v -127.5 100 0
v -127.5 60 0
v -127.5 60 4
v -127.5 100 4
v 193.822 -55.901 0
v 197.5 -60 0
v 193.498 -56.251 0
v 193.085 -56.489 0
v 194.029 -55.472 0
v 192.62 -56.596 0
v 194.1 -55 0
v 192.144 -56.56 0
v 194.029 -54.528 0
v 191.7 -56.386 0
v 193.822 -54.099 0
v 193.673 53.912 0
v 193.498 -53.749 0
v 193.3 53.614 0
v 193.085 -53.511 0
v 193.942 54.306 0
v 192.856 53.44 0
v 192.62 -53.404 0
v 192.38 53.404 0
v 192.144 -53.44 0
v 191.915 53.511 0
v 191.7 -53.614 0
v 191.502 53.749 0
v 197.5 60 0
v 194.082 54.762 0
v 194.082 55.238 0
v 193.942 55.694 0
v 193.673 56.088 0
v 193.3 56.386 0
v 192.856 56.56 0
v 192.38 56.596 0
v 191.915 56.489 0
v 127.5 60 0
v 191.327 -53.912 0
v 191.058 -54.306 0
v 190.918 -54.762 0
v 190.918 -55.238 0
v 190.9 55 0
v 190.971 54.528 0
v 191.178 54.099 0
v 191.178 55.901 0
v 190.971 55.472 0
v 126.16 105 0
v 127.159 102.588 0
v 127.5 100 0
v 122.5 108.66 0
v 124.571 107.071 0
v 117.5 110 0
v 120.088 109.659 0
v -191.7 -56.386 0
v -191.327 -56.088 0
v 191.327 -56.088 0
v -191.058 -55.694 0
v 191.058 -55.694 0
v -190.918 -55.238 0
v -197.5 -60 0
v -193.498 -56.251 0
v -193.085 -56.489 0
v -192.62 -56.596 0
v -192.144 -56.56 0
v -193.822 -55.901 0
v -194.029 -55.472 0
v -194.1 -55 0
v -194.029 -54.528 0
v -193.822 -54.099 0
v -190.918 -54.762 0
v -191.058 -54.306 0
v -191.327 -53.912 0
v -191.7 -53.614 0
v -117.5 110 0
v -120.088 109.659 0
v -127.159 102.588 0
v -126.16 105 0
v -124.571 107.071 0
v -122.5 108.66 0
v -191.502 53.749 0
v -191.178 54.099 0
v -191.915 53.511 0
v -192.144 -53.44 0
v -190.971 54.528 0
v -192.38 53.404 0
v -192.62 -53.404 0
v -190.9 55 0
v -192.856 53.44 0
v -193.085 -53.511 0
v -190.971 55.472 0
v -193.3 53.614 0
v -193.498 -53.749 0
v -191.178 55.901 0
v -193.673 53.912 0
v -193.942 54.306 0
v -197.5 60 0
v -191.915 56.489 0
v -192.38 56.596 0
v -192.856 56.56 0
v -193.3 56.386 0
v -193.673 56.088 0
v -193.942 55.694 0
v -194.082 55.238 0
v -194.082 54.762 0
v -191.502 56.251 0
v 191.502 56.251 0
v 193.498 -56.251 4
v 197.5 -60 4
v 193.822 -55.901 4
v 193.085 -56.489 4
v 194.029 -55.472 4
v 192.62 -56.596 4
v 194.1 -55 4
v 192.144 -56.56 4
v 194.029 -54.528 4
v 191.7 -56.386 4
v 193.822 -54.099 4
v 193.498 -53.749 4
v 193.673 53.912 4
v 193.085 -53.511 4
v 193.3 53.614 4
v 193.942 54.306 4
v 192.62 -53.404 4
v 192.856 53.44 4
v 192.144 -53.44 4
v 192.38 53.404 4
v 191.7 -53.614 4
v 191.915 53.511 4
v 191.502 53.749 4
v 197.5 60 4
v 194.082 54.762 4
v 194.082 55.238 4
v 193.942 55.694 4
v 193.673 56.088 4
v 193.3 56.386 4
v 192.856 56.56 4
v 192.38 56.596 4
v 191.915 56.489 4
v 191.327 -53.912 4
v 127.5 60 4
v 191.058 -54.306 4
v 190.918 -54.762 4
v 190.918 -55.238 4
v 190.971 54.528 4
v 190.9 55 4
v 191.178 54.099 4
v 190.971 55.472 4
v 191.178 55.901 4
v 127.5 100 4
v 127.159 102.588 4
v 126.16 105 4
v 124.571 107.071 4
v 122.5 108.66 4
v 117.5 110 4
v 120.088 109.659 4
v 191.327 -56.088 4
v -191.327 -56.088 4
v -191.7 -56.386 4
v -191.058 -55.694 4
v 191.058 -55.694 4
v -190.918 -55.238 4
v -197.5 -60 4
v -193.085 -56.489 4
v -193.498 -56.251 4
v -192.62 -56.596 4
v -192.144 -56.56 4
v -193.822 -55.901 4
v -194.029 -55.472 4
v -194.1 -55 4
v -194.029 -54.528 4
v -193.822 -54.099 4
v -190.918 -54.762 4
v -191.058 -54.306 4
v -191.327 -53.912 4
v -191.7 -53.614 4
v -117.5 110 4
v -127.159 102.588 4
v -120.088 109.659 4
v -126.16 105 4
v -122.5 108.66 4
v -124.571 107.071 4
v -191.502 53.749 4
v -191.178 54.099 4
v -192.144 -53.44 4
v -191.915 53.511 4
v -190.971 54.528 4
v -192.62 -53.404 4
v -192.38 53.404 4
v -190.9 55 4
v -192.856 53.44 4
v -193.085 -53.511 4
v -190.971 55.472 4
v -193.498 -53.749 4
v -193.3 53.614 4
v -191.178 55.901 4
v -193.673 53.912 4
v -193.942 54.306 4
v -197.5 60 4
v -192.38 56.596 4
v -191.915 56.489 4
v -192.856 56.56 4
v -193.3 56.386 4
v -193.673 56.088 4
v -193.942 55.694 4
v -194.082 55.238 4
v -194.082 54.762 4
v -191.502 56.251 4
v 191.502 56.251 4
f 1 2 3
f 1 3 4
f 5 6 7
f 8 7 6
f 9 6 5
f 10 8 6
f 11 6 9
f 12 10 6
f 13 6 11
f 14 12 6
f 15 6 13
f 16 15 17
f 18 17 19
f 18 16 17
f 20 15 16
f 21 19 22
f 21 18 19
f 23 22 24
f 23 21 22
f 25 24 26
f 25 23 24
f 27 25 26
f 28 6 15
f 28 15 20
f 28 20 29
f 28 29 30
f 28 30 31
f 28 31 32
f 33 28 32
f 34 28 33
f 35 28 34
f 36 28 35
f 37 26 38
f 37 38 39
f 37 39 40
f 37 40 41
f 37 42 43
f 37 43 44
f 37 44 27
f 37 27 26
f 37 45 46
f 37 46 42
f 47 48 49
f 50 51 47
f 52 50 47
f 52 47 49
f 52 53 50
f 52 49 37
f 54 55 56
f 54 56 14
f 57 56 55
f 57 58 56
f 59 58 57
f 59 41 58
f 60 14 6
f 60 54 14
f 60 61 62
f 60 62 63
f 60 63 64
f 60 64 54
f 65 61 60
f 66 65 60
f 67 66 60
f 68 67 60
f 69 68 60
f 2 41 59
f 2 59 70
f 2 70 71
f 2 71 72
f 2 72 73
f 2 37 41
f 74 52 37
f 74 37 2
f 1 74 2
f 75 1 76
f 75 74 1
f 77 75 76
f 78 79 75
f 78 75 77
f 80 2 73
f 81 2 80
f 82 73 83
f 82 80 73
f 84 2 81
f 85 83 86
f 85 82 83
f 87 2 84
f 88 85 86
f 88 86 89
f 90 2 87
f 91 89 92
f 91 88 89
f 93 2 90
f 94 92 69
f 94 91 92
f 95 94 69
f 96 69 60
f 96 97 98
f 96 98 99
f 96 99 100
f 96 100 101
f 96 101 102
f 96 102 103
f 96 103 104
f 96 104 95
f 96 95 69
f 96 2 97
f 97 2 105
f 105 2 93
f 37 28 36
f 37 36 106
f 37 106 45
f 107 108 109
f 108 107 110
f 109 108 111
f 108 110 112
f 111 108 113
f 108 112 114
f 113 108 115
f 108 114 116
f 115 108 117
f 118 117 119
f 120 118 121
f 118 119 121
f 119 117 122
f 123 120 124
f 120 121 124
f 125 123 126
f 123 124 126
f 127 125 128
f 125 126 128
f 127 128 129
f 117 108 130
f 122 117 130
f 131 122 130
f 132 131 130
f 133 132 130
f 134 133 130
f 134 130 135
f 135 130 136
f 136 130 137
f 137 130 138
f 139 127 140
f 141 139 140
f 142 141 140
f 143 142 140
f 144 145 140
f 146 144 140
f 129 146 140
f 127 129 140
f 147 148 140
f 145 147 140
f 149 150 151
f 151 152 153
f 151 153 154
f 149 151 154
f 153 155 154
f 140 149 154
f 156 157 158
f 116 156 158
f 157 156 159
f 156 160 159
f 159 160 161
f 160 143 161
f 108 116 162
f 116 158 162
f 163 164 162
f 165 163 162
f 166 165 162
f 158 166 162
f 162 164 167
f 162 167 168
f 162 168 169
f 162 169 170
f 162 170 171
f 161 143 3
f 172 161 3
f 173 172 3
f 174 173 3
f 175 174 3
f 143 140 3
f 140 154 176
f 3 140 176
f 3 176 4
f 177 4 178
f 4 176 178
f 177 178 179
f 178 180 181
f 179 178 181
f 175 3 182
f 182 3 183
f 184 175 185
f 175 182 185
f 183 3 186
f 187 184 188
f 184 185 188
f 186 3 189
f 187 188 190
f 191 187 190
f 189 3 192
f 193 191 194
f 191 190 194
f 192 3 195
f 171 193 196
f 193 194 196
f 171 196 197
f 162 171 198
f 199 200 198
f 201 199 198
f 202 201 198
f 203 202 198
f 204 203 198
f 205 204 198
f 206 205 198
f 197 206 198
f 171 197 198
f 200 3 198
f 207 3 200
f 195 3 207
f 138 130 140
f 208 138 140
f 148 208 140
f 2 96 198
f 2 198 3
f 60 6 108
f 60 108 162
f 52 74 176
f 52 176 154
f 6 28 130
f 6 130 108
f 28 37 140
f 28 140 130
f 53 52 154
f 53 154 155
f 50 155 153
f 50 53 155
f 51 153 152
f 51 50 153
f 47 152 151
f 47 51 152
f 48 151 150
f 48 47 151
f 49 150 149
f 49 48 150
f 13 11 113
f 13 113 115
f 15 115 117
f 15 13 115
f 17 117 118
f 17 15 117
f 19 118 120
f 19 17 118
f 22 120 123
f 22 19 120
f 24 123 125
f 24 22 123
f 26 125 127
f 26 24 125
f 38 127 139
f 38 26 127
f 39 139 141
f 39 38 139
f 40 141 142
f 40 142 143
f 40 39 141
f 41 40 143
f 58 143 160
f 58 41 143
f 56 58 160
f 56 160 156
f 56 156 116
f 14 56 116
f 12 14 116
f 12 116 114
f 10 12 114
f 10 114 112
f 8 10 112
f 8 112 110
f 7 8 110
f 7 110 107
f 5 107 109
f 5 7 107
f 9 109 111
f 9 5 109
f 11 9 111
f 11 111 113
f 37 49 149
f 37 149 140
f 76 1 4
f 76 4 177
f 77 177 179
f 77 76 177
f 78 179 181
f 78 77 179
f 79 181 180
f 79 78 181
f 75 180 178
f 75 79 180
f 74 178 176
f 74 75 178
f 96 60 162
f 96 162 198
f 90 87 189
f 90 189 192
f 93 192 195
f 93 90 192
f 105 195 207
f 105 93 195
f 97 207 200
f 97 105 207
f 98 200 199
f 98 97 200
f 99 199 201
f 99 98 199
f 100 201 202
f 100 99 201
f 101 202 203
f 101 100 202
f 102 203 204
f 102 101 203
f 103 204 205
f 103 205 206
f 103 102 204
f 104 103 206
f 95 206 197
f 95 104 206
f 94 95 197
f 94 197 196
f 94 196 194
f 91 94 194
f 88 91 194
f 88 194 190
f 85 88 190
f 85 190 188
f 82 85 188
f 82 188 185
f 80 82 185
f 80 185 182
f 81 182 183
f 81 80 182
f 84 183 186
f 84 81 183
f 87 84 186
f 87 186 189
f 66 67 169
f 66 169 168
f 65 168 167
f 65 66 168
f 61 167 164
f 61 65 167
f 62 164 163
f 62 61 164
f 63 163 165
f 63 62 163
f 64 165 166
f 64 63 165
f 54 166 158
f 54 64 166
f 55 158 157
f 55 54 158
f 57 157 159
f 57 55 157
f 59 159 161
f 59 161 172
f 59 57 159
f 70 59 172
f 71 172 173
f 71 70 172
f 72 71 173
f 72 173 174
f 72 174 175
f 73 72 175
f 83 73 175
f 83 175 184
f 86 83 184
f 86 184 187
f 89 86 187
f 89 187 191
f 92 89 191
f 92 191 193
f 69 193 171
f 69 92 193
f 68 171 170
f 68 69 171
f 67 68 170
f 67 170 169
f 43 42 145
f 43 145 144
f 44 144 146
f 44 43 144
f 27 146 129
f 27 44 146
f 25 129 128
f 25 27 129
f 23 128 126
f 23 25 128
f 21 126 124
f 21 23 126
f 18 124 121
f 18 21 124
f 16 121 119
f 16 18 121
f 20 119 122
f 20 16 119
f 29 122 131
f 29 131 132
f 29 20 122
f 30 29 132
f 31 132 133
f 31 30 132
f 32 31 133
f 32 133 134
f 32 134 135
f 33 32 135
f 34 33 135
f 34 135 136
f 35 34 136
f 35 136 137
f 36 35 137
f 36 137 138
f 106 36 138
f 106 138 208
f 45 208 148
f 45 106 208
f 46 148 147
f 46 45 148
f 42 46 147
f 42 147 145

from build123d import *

# Parameters (mm, degrees)
SKETCH_1_R      = 1.6
EXTRUDE_1_DEPTH = 4


with BuildPart() as part:
    # 草图1 → 凸台-拉伸1 (new body)
    with BuildSketch(Plane.XY):
        with BuildLine():
            Line((-197.5, 60), (-127.5, 60))
            Line((-127.5, 60), (-127.5, 100))
            ThreePointArc((-127.5, 100), (-124.571067812, 107.071067812), (-117.5, 110))
            Line((-117.5, 110), (117.5, 110))
            ThreePointArc((117.5, 110), (124.571067812, 107.071067812), (127.5, 100))
            Line((127.5, 100), (127.5, 60))
            Line((127.5, 60), (197.5, 60))
            Line((197.5, 60), (197.5, -60))
            Line((197.5, -60), (-197.5, -60))
            Line((-197.5, -60), (-197.5, 60))
        make_face()
        with Locations((-192.5, 55)):
            Circle(SKETCH_1_R, mode=Mode.SUBTRACT)
        with Locations(Location((192.5, 55, 0), (0, 0, 180))):
            Circle(SKETCH_1_R, mode=Mode.SUBTRACT)
        with Locations((192.5, -55)):
            Circle(SKETCH_1_R, mode=Mode.SUBTRACT)
        with Locations(Location((-192.5, -55, 0), (0, 0, 180))):
            Circle(SKETCH_1_R, mode=Mode.SUBTRACT)
    extrude(amount=EXTRUDE_1_DEPTH)


solid = part.part
